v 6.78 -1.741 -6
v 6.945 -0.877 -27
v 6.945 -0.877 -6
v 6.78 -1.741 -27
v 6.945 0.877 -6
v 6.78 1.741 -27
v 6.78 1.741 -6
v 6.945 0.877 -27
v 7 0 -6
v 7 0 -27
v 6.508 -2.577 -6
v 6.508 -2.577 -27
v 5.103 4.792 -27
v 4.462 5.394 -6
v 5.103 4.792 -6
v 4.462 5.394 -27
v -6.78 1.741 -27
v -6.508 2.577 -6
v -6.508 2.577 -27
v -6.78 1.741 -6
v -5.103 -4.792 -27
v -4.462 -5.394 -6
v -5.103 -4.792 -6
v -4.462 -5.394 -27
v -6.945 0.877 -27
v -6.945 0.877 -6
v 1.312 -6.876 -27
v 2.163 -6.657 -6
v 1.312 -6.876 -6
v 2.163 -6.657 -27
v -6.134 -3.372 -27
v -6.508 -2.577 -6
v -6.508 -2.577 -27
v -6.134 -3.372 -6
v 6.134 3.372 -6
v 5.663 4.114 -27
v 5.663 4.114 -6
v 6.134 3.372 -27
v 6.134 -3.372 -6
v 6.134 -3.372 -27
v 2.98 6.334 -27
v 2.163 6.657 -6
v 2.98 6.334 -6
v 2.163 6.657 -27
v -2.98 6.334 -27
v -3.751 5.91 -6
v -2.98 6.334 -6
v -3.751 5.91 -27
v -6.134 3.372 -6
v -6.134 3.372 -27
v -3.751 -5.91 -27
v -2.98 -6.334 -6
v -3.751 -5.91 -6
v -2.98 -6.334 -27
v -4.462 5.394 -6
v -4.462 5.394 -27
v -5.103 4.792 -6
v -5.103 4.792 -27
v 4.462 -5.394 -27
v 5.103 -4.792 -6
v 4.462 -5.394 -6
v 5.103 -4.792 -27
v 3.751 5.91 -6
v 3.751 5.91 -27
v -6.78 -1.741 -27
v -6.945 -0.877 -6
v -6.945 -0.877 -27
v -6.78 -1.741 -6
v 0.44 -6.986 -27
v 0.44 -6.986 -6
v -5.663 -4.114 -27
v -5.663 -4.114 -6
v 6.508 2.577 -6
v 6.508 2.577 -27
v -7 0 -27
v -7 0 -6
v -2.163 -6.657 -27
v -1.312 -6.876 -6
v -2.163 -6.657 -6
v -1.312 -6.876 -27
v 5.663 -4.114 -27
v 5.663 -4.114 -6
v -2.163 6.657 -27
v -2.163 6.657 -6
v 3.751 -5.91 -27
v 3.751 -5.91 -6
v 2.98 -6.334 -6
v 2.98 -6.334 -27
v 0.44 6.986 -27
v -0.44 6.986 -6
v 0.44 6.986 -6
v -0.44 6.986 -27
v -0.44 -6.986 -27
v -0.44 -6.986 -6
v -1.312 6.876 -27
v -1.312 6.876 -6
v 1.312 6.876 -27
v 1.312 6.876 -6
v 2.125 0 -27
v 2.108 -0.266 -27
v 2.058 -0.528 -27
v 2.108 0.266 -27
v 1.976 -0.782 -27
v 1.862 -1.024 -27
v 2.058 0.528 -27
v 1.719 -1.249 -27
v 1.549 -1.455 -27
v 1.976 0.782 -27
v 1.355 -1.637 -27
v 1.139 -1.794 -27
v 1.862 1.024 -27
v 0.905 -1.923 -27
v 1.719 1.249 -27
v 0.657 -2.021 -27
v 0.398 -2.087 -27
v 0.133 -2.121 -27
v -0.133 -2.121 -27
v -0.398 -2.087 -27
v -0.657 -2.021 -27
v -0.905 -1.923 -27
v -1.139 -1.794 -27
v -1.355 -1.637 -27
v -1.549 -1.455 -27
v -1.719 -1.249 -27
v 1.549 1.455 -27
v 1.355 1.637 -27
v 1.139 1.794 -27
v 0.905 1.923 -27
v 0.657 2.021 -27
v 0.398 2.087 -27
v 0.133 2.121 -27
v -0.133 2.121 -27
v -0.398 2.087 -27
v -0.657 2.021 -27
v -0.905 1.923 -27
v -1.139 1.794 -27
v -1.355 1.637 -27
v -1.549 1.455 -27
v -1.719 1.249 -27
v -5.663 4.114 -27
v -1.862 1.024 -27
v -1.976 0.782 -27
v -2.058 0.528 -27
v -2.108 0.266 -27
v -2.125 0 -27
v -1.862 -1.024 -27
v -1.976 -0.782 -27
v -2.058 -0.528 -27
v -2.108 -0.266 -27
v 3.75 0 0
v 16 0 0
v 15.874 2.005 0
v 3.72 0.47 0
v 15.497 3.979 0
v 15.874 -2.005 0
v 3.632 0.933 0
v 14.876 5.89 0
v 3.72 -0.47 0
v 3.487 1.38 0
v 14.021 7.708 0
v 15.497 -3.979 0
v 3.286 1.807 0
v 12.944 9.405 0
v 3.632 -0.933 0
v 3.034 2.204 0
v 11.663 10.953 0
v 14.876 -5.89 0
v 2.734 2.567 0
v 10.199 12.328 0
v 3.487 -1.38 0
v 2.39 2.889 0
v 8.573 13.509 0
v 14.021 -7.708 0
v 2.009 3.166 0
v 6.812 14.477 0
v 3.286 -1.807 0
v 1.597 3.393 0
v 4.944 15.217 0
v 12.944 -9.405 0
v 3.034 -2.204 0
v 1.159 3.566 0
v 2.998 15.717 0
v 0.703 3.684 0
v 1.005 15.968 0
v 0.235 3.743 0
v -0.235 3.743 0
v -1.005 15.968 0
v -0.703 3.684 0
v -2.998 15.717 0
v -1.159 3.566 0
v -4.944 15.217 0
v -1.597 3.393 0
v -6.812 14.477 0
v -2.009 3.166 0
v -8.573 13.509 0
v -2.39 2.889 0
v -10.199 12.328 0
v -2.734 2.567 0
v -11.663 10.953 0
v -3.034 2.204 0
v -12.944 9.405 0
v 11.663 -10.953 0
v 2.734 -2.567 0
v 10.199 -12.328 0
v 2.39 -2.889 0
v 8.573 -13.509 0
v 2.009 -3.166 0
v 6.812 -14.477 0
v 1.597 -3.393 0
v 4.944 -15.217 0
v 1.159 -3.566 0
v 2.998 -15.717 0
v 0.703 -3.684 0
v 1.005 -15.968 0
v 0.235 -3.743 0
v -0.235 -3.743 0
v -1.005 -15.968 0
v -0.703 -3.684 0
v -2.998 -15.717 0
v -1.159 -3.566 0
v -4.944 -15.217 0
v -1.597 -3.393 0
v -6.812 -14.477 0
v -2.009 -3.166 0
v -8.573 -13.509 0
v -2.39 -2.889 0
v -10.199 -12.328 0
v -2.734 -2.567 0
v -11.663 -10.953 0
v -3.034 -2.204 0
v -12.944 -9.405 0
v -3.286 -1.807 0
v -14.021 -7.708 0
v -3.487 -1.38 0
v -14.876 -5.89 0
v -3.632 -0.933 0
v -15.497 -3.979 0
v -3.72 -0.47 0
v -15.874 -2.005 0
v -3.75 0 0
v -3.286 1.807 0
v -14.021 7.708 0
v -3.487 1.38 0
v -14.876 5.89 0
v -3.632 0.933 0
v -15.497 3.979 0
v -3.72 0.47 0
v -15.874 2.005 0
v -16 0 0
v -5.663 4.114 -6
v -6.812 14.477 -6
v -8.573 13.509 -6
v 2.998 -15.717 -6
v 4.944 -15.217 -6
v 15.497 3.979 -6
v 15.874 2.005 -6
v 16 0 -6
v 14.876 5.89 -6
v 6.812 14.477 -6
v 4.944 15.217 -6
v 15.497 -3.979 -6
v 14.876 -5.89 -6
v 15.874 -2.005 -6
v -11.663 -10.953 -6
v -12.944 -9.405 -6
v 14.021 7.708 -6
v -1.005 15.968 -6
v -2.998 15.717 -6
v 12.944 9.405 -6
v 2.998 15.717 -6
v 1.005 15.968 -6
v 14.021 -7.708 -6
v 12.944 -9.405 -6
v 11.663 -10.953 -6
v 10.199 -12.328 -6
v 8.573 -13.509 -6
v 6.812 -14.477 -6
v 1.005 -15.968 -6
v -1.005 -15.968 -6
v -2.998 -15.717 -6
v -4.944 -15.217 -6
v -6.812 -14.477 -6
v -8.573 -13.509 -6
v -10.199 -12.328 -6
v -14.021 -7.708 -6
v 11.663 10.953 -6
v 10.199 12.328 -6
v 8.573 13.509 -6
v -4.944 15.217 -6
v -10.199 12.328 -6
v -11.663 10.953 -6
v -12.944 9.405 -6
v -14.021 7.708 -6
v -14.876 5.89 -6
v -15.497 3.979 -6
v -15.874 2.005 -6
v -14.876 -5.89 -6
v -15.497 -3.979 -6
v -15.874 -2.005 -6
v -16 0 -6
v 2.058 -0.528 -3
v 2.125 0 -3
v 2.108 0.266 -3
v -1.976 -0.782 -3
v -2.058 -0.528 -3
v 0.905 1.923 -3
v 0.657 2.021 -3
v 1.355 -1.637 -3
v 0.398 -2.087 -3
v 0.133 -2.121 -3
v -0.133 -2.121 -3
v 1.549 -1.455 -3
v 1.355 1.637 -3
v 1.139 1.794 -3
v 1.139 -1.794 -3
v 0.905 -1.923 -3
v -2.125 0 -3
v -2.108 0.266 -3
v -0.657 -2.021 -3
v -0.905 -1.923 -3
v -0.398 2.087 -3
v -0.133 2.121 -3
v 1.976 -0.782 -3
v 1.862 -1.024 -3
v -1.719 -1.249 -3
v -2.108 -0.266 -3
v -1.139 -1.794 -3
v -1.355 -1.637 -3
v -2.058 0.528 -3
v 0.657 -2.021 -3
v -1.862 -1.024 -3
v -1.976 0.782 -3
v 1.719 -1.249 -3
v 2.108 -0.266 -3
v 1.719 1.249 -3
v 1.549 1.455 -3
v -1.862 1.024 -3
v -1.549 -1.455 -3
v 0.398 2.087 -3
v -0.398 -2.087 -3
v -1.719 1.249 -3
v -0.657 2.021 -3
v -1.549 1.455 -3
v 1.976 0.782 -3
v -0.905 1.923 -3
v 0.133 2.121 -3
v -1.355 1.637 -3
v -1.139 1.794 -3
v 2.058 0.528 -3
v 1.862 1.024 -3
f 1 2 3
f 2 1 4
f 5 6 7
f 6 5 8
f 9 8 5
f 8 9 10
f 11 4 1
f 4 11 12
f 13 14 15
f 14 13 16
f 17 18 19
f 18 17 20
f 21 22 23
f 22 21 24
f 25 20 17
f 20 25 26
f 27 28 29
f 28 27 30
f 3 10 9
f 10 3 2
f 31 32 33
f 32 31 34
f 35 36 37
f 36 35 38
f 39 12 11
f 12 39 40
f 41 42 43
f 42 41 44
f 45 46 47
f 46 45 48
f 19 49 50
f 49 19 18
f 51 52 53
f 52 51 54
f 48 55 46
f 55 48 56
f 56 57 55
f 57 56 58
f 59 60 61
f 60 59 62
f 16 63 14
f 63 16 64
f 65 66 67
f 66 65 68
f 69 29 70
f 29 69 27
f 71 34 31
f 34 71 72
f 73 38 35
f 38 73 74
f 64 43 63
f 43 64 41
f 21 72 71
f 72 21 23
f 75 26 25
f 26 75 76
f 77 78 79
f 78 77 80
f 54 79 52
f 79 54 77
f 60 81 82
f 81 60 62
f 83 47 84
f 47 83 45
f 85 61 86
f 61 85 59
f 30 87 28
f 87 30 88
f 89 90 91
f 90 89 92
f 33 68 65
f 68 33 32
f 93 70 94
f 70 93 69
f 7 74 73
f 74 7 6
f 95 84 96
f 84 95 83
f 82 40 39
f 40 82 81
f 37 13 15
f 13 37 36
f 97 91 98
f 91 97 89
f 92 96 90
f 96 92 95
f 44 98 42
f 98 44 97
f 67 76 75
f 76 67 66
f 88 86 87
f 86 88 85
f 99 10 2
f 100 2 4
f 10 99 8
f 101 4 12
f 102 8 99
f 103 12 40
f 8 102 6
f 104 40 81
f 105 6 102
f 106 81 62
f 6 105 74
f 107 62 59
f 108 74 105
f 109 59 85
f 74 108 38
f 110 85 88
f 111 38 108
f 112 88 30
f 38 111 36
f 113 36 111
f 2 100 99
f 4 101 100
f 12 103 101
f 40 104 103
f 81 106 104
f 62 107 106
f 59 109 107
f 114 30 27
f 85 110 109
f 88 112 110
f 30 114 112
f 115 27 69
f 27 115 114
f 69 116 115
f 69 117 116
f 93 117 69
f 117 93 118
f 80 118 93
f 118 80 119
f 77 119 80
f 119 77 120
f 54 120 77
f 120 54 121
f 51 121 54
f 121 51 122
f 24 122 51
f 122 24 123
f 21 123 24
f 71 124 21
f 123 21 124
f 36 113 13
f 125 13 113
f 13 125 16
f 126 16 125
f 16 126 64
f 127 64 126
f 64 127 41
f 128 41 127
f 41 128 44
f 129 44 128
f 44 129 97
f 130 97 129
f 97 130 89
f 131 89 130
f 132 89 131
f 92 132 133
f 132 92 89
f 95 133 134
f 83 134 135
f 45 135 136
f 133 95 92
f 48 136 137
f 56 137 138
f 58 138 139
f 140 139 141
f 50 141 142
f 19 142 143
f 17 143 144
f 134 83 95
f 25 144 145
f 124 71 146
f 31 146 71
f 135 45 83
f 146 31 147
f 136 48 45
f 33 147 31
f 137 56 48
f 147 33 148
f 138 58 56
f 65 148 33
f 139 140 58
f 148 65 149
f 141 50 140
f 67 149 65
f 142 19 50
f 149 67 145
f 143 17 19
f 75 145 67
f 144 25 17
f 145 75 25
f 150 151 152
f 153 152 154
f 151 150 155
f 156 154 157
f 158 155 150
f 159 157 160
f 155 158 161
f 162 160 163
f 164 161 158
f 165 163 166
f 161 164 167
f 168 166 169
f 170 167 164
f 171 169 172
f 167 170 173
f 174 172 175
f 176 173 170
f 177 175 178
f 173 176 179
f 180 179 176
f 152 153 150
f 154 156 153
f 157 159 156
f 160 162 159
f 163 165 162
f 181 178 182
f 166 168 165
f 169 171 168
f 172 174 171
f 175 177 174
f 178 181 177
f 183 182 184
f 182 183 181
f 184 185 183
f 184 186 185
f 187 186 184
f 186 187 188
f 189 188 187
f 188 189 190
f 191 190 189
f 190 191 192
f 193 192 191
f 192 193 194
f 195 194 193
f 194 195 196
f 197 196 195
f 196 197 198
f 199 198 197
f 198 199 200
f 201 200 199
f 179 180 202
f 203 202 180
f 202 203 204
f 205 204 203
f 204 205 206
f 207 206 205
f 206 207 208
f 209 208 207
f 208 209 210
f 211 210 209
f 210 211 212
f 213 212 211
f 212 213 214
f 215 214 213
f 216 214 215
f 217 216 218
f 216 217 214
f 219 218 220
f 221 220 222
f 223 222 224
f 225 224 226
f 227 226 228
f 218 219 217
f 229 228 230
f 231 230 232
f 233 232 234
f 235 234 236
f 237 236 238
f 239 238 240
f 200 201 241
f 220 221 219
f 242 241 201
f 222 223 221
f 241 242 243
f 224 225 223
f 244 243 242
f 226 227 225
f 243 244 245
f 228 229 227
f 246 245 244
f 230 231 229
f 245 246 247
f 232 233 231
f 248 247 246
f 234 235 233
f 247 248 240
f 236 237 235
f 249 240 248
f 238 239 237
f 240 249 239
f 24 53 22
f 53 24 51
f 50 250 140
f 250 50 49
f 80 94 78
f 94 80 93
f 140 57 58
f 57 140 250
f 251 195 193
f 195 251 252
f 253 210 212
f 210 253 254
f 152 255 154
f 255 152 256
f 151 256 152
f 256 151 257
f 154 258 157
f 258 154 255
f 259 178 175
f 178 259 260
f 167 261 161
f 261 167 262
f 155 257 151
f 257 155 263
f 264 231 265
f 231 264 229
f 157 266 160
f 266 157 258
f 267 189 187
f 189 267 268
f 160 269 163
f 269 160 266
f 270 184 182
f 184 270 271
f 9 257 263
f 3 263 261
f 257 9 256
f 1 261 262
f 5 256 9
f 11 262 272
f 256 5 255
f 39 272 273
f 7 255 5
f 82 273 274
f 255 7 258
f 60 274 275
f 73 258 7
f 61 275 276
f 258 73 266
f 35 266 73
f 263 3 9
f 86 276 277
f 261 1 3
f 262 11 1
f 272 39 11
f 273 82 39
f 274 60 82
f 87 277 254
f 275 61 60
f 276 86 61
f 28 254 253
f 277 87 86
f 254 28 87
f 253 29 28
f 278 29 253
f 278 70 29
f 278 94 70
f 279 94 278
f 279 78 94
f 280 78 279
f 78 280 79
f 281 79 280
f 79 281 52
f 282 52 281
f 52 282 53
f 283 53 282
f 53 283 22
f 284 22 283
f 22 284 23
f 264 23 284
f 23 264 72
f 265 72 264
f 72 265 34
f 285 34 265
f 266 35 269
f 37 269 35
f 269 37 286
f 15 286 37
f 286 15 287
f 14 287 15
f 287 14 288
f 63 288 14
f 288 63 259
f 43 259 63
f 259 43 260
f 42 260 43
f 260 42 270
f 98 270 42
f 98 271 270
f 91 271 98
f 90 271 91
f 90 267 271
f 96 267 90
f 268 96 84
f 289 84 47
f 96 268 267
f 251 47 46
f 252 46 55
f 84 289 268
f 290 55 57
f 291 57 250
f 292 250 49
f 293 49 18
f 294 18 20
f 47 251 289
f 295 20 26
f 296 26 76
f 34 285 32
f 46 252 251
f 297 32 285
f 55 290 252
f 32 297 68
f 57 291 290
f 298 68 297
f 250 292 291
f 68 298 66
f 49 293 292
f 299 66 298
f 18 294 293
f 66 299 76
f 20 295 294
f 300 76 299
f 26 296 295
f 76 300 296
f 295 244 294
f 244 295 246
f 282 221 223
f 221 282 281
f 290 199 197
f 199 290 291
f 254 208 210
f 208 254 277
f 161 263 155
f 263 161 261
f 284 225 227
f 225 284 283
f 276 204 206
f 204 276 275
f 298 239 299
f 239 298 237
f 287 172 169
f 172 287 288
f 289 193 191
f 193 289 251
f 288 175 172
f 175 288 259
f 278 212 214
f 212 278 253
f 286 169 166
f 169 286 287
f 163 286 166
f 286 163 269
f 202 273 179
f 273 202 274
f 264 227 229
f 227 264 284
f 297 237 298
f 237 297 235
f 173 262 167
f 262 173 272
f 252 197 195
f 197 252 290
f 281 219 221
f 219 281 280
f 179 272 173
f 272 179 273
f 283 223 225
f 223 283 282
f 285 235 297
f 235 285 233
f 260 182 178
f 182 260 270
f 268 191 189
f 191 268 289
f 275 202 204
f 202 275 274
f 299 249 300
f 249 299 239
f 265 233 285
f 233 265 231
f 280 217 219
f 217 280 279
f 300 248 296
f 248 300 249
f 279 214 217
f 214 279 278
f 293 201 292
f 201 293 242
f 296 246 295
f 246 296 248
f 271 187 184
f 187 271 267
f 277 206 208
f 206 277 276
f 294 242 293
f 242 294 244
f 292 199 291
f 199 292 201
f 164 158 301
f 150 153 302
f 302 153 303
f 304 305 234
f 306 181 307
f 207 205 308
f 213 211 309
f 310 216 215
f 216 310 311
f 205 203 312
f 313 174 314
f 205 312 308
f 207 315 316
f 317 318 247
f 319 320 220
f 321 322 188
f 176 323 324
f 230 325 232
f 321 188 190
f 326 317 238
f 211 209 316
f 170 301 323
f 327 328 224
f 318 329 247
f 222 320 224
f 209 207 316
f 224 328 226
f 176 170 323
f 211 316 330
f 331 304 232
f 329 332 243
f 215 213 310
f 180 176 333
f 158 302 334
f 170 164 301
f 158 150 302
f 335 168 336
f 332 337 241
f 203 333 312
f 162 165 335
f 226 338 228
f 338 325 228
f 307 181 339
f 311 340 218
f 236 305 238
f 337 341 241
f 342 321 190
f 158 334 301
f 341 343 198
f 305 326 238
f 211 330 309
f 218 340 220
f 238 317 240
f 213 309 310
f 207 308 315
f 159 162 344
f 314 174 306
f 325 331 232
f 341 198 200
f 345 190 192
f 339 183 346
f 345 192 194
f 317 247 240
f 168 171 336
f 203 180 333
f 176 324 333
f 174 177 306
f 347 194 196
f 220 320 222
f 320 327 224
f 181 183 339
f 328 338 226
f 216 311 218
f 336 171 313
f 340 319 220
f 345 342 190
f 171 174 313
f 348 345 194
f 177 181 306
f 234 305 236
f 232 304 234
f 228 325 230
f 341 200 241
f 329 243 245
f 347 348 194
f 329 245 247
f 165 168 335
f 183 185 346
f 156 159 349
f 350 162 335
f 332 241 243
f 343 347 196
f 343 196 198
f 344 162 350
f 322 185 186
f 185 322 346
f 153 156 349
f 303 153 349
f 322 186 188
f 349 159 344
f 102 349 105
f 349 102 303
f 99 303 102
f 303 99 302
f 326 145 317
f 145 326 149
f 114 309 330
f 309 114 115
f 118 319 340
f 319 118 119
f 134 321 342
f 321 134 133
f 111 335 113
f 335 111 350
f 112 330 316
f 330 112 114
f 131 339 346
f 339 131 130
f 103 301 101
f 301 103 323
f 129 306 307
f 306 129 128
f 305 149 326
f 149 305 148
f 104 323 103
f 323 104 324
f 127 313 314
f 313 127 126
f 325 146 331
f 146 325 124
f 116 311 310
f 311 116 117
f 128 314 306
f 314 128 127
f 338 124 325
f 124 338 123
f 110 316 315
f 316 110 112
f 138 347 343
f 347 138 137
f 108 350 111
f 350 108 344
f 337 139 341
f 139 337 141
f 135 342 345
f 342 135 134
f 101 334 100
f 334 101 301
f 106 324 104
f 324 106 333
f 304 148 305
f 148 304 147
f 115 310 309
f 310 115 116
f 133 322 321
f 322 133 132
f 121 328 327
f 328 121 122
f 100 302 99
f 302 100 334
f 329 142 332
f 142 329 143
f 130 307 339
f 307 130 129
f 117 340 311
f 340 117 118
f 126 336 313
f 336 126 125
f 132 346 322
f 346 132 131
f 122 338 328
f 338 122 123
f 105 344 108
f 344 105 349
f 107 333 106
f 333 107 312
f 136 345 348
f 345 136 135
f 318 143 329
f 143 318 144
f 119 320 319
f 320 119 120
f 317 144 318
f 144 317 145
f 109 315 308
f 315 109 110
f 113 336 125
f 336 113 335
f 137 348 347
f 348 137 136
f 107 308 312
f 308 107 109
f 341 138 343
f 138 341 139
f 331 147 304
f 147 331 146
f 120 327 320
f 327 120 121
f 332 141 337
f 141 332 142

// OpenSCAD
$fn = 50;


difference() {
	union() {
		translate(v = [0, 0, -27.0000000000]) {
			cylinder(h = 27, r = 7.0000000000);
		}
		translate(v = [0, 0, -6.0000000000]) {
			cylinder(h = 6, r = 16.0000000000);
		}
	}
	union() {
		translate(v = [0, 0, 0]) {
			rotate(a = [0, 0, 0]) {
				difference() {
					union() {
						#translate(v = [0, 0, -27.0000000000]) {
							cylinder(h = 27, r = 2.0000000000);
						}
						#translate(v = [0, 0, -3]) {
							cylinder(h = 3, r = 7.0000000000, r1 = 2.1250000000, r2 = 3.7500000000);
						}
						#translate(v = [0, 0, -27.0000000000]) {
							cylinder(h = 27, r = 2.1250000000);
						}
						#translate(v = [0, 0, -27.0000000000]) {
							cylinder(h = 27, r = 2.0000000000);
						}
					}
					union();
				}
			}
		}
	}
}
